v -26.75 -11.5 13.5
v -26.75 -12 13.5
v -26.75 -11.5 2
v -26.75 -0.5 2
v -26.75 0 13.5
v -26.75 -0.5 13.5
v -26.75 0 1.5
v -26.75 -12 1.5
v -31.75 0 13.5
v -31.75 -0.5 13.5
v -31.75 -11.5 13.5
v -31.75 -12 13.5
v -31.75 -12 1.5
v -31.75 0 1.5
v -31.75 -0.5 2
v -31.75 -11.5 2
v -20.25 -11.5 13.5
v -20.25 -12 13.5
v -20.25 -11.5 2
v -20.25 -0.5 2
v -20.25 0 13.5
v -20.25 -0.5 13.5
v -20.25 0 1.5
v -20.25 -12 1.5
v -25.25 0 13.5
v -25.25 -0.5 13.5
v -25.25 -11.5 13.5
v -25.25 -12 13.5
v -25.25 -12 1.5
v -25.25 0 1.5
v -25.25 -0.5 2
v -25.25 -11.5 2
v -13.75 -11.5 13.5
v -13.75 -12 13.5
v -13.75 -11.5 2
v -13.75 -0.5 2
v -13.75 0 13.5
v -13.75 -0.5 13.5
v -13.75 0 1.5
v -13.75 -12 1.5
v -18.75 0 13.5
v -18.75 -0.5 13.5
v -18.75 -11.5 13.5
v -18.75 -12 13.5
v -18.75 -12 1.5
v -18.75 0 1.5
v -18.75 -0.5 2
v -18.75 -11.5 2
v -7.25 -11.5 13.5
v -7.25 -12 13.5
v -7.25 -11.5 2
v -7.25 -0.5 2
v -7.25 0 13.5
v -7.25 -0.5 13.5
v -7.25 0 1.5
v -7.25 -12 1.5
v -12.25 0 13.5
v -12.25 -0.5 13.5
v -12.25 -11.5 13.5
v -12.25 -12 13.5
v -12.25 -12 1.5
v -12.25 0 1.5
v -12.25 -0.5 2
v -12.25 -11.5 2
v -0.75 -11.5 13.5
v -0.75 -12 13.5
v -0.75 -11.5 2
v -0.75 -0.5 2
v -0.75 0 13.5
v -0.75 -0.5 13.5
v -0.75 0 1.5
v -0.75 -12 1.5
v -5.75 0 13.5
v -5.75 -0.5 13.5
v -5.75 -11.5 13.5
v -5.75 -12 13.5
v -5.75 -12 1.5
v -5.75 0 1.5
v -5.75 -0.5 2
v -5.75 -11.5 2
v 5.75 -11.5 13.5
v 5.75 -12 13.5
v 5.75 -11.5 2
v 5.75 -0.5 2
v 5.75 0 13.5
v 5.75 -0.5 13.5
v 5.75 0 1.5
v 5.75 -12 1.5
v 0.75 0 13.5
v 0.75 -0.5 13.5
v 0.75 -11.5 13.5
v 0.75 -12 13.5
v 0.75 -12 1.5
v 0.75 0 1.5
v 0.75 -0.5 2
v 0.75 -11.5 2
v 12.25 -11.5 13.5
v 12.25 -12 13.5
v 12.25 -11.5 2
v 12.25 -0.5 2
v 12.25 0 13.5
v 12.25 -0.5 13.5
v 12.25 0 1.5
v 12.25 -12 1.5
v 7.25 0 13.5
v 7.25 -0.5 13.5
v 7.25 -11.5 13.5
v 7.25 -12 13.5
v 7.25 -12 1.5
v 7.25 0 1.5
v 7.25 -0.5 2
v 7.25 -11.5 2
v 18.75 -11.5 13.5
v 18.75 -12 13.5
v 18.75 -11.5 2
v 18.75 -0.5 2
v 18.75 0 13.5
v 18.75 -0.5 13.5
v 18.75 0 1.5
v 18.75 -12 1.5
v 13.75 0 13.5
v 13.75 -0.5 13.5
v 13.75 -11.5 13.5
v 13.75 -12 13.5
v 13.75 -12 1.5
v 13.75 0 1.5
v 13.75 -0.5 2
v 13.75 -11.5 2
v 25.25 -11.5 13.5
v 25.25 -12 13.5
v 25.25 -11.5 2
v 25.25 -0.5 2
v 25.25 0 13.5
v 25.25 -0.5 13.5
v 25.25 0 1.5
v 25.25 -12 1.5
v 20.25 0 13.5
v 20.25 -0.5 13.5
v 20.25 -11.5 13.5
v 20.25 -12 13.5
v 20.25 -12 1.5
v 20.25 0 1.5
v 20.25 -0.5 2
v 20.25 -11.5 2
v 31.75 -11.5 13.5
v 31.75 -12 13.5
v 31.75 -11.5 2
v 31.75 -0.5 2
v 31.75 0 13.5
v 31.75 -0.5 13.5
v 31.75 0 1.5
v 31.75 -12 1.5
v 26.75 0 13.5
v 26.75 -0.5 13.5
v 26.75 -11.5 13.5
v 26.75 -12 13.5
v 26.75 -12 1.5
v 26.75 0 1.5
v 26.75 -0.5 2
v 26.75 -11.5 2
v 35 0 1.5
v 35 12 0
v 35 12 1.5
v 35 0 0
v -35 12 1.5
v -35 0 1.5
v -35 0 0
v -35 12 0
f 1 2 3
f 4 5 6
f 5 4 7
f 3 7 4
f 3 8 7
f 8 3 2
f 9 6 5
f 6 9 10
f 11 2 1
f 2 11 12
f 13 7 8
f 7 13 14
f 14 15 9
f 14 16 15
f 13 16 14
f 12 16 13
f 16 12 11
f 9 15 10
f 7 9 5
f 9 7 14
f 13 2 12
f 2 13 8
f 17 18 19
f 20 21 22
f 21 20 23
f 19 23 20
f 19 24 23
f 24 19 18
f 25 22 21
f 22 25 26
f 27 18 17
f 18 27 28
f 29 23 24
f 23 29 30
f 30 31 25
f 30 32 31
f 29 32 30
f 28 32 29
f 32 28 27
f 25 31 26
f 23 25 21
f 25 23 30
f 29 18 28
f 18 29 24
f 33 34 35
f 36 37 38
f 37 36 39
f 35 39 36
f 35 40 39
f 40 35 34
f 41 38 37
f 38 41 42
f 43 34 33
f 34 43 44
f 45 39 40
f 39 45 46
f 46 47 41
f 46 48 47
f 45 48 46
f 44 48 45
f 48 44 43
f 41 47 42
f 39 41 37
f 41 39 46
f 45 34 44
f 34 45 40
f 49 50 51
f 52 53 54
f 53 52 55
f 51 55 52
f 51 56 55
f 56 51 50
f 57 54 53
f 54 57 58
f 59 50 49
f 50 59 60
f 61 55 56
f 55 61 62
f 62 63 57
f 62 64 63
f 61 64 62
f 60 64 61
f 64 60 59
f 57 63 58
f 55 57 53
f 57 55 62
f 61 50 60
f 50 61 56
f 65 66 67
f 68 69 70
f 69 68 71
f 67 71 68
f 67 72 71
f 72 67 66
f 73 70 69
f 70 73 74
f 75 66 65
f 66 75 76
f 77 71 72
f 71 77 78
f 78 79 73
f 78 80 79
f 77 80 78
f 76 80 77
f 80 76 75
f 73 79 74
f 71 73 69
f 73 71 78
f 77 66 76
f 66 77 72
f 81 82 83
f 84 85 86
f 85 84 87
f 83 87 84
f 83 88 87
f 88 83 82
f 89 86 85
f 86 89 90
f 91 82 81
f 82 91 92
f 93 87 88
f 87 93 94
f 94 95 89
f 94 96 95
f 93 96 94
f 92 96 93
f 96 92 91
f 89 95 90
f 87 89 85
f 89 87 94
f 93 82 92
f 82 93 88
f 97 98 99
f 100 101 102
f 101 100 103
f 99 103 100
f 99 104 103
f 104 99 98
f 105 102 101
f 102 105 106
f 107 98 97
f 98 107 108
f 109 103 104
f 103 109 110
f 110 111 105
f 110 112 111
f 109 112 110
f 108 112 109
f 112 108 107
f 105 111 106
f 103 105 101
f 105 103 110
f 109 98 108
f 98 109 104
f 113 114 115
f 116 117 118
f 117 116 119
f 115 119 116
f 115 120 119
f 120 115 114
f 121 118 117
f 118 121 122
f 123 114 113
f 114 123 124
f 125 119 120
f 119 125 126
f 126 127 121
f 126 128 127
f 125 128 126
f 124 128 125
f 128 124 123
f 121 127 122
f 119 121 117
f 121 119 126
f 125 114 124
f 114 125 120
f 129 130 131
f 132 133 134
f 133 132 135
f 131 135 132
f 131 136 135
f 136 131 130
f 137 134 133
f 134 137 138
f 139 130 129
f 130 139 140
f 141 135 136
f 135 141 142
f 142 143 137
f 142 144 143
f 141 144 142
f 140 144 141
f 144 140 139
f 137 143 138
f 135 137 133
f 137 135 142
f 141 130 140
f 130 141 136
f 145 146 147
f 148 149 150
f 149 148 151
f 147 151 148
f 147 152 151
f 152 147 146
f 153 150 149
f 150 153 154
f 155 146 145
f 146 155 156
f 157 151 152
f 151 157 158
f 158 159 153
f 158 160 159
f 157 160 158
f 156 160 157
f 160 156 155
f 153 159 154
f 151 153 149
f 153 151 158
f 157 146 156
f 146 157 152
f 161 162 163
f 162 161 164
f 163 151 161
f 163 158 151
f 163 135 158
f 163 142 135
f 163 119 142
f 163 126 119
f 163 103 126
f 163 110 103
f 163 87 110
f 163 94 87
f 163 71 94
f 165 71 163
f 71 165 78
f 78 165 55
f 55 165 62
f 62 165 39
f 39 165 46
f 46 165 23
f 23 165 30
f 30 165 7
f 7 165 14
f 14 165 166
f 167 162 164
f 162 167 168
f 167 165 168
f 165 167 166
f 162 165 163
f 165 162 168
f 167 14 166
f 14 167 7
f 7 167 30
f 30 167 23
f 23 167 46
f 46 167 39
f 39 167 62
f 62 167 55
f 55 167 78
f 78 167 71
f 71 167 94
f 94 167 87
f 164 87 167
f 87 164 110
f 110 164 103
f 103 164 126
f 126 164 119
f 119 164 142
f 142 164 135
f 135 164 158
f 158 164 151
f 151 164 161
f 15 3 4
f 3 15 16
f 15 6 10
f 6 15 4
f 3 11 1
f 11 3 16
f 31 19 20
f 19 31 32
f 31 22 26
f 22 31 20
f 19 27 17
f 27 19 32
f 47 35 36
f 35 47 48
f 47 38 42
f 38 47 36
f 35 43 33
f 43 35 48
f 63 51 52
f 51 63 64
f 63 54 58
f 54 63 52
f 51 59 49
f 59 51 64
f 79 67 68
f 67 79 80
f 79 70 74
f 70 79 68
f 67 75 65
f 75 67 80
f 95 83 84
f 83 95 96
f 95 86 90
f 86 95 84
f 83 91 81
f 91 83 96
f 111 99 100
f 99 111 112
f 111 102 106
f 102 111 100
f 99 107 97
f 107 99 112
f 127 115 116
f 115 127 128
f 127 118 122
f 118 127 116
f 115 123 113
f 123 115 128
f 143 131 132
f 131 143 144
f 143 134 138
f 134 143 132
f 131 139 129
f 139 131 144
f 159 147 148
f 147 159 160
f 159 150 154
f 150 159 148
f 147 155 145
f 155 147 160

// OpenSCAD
// 10-well agarose gel comb - printed lying flat
// Units: mm

// ---------- Parameters ----------
plate_t      = 1.5;   // plate thickness (Z)
spine_len    = 70;    // spine length (X)
spine_w      = 12;    // spine width (Y)
tooth_count  = 10;    // number of teeth
tooth_w      = 5.0;   // tooth width (X)
tooth_len    = 12;    // tooth length (Y)
tooth_h      = 12;    // tooth height from spine top edge (Z)
gap          = 1.5;   // gap between teeth (X)
eps          = 0.5;   // cutter overshoot

$fn = 64;

// ---------- Derived ----------
pitch   = tooth_w + gap;
x_start = -(tooth_count - 1) * pitch / 2;

// ---------- Model ----------
difference() {
    union() {
        // Spine
        translate([-spine_len / 2, 0, 0])
            cube([spine_len, spine_w, plate_t]);

        // Teeth
        for (i = [0 : tooth_count - 1])
            translate([x_start + i * pitch - tooth_w / 2,
                       -tooth_len,
                       plate_t])
                cube([tooth_w, tooth_len, tooth_h]);
    }

    // Remove overlapping tooth / spine faces
    for (i = [0 : tooth_count - 1])
        translate([x_start + i * pitch - tooth_w / 2 - eps,
                   -tooth_len + eps,
                   plate_t + eps])
            cube([tooth_w + 2 * eps, tooth_len - 2 * eps, tooth_h + eps]);
}
